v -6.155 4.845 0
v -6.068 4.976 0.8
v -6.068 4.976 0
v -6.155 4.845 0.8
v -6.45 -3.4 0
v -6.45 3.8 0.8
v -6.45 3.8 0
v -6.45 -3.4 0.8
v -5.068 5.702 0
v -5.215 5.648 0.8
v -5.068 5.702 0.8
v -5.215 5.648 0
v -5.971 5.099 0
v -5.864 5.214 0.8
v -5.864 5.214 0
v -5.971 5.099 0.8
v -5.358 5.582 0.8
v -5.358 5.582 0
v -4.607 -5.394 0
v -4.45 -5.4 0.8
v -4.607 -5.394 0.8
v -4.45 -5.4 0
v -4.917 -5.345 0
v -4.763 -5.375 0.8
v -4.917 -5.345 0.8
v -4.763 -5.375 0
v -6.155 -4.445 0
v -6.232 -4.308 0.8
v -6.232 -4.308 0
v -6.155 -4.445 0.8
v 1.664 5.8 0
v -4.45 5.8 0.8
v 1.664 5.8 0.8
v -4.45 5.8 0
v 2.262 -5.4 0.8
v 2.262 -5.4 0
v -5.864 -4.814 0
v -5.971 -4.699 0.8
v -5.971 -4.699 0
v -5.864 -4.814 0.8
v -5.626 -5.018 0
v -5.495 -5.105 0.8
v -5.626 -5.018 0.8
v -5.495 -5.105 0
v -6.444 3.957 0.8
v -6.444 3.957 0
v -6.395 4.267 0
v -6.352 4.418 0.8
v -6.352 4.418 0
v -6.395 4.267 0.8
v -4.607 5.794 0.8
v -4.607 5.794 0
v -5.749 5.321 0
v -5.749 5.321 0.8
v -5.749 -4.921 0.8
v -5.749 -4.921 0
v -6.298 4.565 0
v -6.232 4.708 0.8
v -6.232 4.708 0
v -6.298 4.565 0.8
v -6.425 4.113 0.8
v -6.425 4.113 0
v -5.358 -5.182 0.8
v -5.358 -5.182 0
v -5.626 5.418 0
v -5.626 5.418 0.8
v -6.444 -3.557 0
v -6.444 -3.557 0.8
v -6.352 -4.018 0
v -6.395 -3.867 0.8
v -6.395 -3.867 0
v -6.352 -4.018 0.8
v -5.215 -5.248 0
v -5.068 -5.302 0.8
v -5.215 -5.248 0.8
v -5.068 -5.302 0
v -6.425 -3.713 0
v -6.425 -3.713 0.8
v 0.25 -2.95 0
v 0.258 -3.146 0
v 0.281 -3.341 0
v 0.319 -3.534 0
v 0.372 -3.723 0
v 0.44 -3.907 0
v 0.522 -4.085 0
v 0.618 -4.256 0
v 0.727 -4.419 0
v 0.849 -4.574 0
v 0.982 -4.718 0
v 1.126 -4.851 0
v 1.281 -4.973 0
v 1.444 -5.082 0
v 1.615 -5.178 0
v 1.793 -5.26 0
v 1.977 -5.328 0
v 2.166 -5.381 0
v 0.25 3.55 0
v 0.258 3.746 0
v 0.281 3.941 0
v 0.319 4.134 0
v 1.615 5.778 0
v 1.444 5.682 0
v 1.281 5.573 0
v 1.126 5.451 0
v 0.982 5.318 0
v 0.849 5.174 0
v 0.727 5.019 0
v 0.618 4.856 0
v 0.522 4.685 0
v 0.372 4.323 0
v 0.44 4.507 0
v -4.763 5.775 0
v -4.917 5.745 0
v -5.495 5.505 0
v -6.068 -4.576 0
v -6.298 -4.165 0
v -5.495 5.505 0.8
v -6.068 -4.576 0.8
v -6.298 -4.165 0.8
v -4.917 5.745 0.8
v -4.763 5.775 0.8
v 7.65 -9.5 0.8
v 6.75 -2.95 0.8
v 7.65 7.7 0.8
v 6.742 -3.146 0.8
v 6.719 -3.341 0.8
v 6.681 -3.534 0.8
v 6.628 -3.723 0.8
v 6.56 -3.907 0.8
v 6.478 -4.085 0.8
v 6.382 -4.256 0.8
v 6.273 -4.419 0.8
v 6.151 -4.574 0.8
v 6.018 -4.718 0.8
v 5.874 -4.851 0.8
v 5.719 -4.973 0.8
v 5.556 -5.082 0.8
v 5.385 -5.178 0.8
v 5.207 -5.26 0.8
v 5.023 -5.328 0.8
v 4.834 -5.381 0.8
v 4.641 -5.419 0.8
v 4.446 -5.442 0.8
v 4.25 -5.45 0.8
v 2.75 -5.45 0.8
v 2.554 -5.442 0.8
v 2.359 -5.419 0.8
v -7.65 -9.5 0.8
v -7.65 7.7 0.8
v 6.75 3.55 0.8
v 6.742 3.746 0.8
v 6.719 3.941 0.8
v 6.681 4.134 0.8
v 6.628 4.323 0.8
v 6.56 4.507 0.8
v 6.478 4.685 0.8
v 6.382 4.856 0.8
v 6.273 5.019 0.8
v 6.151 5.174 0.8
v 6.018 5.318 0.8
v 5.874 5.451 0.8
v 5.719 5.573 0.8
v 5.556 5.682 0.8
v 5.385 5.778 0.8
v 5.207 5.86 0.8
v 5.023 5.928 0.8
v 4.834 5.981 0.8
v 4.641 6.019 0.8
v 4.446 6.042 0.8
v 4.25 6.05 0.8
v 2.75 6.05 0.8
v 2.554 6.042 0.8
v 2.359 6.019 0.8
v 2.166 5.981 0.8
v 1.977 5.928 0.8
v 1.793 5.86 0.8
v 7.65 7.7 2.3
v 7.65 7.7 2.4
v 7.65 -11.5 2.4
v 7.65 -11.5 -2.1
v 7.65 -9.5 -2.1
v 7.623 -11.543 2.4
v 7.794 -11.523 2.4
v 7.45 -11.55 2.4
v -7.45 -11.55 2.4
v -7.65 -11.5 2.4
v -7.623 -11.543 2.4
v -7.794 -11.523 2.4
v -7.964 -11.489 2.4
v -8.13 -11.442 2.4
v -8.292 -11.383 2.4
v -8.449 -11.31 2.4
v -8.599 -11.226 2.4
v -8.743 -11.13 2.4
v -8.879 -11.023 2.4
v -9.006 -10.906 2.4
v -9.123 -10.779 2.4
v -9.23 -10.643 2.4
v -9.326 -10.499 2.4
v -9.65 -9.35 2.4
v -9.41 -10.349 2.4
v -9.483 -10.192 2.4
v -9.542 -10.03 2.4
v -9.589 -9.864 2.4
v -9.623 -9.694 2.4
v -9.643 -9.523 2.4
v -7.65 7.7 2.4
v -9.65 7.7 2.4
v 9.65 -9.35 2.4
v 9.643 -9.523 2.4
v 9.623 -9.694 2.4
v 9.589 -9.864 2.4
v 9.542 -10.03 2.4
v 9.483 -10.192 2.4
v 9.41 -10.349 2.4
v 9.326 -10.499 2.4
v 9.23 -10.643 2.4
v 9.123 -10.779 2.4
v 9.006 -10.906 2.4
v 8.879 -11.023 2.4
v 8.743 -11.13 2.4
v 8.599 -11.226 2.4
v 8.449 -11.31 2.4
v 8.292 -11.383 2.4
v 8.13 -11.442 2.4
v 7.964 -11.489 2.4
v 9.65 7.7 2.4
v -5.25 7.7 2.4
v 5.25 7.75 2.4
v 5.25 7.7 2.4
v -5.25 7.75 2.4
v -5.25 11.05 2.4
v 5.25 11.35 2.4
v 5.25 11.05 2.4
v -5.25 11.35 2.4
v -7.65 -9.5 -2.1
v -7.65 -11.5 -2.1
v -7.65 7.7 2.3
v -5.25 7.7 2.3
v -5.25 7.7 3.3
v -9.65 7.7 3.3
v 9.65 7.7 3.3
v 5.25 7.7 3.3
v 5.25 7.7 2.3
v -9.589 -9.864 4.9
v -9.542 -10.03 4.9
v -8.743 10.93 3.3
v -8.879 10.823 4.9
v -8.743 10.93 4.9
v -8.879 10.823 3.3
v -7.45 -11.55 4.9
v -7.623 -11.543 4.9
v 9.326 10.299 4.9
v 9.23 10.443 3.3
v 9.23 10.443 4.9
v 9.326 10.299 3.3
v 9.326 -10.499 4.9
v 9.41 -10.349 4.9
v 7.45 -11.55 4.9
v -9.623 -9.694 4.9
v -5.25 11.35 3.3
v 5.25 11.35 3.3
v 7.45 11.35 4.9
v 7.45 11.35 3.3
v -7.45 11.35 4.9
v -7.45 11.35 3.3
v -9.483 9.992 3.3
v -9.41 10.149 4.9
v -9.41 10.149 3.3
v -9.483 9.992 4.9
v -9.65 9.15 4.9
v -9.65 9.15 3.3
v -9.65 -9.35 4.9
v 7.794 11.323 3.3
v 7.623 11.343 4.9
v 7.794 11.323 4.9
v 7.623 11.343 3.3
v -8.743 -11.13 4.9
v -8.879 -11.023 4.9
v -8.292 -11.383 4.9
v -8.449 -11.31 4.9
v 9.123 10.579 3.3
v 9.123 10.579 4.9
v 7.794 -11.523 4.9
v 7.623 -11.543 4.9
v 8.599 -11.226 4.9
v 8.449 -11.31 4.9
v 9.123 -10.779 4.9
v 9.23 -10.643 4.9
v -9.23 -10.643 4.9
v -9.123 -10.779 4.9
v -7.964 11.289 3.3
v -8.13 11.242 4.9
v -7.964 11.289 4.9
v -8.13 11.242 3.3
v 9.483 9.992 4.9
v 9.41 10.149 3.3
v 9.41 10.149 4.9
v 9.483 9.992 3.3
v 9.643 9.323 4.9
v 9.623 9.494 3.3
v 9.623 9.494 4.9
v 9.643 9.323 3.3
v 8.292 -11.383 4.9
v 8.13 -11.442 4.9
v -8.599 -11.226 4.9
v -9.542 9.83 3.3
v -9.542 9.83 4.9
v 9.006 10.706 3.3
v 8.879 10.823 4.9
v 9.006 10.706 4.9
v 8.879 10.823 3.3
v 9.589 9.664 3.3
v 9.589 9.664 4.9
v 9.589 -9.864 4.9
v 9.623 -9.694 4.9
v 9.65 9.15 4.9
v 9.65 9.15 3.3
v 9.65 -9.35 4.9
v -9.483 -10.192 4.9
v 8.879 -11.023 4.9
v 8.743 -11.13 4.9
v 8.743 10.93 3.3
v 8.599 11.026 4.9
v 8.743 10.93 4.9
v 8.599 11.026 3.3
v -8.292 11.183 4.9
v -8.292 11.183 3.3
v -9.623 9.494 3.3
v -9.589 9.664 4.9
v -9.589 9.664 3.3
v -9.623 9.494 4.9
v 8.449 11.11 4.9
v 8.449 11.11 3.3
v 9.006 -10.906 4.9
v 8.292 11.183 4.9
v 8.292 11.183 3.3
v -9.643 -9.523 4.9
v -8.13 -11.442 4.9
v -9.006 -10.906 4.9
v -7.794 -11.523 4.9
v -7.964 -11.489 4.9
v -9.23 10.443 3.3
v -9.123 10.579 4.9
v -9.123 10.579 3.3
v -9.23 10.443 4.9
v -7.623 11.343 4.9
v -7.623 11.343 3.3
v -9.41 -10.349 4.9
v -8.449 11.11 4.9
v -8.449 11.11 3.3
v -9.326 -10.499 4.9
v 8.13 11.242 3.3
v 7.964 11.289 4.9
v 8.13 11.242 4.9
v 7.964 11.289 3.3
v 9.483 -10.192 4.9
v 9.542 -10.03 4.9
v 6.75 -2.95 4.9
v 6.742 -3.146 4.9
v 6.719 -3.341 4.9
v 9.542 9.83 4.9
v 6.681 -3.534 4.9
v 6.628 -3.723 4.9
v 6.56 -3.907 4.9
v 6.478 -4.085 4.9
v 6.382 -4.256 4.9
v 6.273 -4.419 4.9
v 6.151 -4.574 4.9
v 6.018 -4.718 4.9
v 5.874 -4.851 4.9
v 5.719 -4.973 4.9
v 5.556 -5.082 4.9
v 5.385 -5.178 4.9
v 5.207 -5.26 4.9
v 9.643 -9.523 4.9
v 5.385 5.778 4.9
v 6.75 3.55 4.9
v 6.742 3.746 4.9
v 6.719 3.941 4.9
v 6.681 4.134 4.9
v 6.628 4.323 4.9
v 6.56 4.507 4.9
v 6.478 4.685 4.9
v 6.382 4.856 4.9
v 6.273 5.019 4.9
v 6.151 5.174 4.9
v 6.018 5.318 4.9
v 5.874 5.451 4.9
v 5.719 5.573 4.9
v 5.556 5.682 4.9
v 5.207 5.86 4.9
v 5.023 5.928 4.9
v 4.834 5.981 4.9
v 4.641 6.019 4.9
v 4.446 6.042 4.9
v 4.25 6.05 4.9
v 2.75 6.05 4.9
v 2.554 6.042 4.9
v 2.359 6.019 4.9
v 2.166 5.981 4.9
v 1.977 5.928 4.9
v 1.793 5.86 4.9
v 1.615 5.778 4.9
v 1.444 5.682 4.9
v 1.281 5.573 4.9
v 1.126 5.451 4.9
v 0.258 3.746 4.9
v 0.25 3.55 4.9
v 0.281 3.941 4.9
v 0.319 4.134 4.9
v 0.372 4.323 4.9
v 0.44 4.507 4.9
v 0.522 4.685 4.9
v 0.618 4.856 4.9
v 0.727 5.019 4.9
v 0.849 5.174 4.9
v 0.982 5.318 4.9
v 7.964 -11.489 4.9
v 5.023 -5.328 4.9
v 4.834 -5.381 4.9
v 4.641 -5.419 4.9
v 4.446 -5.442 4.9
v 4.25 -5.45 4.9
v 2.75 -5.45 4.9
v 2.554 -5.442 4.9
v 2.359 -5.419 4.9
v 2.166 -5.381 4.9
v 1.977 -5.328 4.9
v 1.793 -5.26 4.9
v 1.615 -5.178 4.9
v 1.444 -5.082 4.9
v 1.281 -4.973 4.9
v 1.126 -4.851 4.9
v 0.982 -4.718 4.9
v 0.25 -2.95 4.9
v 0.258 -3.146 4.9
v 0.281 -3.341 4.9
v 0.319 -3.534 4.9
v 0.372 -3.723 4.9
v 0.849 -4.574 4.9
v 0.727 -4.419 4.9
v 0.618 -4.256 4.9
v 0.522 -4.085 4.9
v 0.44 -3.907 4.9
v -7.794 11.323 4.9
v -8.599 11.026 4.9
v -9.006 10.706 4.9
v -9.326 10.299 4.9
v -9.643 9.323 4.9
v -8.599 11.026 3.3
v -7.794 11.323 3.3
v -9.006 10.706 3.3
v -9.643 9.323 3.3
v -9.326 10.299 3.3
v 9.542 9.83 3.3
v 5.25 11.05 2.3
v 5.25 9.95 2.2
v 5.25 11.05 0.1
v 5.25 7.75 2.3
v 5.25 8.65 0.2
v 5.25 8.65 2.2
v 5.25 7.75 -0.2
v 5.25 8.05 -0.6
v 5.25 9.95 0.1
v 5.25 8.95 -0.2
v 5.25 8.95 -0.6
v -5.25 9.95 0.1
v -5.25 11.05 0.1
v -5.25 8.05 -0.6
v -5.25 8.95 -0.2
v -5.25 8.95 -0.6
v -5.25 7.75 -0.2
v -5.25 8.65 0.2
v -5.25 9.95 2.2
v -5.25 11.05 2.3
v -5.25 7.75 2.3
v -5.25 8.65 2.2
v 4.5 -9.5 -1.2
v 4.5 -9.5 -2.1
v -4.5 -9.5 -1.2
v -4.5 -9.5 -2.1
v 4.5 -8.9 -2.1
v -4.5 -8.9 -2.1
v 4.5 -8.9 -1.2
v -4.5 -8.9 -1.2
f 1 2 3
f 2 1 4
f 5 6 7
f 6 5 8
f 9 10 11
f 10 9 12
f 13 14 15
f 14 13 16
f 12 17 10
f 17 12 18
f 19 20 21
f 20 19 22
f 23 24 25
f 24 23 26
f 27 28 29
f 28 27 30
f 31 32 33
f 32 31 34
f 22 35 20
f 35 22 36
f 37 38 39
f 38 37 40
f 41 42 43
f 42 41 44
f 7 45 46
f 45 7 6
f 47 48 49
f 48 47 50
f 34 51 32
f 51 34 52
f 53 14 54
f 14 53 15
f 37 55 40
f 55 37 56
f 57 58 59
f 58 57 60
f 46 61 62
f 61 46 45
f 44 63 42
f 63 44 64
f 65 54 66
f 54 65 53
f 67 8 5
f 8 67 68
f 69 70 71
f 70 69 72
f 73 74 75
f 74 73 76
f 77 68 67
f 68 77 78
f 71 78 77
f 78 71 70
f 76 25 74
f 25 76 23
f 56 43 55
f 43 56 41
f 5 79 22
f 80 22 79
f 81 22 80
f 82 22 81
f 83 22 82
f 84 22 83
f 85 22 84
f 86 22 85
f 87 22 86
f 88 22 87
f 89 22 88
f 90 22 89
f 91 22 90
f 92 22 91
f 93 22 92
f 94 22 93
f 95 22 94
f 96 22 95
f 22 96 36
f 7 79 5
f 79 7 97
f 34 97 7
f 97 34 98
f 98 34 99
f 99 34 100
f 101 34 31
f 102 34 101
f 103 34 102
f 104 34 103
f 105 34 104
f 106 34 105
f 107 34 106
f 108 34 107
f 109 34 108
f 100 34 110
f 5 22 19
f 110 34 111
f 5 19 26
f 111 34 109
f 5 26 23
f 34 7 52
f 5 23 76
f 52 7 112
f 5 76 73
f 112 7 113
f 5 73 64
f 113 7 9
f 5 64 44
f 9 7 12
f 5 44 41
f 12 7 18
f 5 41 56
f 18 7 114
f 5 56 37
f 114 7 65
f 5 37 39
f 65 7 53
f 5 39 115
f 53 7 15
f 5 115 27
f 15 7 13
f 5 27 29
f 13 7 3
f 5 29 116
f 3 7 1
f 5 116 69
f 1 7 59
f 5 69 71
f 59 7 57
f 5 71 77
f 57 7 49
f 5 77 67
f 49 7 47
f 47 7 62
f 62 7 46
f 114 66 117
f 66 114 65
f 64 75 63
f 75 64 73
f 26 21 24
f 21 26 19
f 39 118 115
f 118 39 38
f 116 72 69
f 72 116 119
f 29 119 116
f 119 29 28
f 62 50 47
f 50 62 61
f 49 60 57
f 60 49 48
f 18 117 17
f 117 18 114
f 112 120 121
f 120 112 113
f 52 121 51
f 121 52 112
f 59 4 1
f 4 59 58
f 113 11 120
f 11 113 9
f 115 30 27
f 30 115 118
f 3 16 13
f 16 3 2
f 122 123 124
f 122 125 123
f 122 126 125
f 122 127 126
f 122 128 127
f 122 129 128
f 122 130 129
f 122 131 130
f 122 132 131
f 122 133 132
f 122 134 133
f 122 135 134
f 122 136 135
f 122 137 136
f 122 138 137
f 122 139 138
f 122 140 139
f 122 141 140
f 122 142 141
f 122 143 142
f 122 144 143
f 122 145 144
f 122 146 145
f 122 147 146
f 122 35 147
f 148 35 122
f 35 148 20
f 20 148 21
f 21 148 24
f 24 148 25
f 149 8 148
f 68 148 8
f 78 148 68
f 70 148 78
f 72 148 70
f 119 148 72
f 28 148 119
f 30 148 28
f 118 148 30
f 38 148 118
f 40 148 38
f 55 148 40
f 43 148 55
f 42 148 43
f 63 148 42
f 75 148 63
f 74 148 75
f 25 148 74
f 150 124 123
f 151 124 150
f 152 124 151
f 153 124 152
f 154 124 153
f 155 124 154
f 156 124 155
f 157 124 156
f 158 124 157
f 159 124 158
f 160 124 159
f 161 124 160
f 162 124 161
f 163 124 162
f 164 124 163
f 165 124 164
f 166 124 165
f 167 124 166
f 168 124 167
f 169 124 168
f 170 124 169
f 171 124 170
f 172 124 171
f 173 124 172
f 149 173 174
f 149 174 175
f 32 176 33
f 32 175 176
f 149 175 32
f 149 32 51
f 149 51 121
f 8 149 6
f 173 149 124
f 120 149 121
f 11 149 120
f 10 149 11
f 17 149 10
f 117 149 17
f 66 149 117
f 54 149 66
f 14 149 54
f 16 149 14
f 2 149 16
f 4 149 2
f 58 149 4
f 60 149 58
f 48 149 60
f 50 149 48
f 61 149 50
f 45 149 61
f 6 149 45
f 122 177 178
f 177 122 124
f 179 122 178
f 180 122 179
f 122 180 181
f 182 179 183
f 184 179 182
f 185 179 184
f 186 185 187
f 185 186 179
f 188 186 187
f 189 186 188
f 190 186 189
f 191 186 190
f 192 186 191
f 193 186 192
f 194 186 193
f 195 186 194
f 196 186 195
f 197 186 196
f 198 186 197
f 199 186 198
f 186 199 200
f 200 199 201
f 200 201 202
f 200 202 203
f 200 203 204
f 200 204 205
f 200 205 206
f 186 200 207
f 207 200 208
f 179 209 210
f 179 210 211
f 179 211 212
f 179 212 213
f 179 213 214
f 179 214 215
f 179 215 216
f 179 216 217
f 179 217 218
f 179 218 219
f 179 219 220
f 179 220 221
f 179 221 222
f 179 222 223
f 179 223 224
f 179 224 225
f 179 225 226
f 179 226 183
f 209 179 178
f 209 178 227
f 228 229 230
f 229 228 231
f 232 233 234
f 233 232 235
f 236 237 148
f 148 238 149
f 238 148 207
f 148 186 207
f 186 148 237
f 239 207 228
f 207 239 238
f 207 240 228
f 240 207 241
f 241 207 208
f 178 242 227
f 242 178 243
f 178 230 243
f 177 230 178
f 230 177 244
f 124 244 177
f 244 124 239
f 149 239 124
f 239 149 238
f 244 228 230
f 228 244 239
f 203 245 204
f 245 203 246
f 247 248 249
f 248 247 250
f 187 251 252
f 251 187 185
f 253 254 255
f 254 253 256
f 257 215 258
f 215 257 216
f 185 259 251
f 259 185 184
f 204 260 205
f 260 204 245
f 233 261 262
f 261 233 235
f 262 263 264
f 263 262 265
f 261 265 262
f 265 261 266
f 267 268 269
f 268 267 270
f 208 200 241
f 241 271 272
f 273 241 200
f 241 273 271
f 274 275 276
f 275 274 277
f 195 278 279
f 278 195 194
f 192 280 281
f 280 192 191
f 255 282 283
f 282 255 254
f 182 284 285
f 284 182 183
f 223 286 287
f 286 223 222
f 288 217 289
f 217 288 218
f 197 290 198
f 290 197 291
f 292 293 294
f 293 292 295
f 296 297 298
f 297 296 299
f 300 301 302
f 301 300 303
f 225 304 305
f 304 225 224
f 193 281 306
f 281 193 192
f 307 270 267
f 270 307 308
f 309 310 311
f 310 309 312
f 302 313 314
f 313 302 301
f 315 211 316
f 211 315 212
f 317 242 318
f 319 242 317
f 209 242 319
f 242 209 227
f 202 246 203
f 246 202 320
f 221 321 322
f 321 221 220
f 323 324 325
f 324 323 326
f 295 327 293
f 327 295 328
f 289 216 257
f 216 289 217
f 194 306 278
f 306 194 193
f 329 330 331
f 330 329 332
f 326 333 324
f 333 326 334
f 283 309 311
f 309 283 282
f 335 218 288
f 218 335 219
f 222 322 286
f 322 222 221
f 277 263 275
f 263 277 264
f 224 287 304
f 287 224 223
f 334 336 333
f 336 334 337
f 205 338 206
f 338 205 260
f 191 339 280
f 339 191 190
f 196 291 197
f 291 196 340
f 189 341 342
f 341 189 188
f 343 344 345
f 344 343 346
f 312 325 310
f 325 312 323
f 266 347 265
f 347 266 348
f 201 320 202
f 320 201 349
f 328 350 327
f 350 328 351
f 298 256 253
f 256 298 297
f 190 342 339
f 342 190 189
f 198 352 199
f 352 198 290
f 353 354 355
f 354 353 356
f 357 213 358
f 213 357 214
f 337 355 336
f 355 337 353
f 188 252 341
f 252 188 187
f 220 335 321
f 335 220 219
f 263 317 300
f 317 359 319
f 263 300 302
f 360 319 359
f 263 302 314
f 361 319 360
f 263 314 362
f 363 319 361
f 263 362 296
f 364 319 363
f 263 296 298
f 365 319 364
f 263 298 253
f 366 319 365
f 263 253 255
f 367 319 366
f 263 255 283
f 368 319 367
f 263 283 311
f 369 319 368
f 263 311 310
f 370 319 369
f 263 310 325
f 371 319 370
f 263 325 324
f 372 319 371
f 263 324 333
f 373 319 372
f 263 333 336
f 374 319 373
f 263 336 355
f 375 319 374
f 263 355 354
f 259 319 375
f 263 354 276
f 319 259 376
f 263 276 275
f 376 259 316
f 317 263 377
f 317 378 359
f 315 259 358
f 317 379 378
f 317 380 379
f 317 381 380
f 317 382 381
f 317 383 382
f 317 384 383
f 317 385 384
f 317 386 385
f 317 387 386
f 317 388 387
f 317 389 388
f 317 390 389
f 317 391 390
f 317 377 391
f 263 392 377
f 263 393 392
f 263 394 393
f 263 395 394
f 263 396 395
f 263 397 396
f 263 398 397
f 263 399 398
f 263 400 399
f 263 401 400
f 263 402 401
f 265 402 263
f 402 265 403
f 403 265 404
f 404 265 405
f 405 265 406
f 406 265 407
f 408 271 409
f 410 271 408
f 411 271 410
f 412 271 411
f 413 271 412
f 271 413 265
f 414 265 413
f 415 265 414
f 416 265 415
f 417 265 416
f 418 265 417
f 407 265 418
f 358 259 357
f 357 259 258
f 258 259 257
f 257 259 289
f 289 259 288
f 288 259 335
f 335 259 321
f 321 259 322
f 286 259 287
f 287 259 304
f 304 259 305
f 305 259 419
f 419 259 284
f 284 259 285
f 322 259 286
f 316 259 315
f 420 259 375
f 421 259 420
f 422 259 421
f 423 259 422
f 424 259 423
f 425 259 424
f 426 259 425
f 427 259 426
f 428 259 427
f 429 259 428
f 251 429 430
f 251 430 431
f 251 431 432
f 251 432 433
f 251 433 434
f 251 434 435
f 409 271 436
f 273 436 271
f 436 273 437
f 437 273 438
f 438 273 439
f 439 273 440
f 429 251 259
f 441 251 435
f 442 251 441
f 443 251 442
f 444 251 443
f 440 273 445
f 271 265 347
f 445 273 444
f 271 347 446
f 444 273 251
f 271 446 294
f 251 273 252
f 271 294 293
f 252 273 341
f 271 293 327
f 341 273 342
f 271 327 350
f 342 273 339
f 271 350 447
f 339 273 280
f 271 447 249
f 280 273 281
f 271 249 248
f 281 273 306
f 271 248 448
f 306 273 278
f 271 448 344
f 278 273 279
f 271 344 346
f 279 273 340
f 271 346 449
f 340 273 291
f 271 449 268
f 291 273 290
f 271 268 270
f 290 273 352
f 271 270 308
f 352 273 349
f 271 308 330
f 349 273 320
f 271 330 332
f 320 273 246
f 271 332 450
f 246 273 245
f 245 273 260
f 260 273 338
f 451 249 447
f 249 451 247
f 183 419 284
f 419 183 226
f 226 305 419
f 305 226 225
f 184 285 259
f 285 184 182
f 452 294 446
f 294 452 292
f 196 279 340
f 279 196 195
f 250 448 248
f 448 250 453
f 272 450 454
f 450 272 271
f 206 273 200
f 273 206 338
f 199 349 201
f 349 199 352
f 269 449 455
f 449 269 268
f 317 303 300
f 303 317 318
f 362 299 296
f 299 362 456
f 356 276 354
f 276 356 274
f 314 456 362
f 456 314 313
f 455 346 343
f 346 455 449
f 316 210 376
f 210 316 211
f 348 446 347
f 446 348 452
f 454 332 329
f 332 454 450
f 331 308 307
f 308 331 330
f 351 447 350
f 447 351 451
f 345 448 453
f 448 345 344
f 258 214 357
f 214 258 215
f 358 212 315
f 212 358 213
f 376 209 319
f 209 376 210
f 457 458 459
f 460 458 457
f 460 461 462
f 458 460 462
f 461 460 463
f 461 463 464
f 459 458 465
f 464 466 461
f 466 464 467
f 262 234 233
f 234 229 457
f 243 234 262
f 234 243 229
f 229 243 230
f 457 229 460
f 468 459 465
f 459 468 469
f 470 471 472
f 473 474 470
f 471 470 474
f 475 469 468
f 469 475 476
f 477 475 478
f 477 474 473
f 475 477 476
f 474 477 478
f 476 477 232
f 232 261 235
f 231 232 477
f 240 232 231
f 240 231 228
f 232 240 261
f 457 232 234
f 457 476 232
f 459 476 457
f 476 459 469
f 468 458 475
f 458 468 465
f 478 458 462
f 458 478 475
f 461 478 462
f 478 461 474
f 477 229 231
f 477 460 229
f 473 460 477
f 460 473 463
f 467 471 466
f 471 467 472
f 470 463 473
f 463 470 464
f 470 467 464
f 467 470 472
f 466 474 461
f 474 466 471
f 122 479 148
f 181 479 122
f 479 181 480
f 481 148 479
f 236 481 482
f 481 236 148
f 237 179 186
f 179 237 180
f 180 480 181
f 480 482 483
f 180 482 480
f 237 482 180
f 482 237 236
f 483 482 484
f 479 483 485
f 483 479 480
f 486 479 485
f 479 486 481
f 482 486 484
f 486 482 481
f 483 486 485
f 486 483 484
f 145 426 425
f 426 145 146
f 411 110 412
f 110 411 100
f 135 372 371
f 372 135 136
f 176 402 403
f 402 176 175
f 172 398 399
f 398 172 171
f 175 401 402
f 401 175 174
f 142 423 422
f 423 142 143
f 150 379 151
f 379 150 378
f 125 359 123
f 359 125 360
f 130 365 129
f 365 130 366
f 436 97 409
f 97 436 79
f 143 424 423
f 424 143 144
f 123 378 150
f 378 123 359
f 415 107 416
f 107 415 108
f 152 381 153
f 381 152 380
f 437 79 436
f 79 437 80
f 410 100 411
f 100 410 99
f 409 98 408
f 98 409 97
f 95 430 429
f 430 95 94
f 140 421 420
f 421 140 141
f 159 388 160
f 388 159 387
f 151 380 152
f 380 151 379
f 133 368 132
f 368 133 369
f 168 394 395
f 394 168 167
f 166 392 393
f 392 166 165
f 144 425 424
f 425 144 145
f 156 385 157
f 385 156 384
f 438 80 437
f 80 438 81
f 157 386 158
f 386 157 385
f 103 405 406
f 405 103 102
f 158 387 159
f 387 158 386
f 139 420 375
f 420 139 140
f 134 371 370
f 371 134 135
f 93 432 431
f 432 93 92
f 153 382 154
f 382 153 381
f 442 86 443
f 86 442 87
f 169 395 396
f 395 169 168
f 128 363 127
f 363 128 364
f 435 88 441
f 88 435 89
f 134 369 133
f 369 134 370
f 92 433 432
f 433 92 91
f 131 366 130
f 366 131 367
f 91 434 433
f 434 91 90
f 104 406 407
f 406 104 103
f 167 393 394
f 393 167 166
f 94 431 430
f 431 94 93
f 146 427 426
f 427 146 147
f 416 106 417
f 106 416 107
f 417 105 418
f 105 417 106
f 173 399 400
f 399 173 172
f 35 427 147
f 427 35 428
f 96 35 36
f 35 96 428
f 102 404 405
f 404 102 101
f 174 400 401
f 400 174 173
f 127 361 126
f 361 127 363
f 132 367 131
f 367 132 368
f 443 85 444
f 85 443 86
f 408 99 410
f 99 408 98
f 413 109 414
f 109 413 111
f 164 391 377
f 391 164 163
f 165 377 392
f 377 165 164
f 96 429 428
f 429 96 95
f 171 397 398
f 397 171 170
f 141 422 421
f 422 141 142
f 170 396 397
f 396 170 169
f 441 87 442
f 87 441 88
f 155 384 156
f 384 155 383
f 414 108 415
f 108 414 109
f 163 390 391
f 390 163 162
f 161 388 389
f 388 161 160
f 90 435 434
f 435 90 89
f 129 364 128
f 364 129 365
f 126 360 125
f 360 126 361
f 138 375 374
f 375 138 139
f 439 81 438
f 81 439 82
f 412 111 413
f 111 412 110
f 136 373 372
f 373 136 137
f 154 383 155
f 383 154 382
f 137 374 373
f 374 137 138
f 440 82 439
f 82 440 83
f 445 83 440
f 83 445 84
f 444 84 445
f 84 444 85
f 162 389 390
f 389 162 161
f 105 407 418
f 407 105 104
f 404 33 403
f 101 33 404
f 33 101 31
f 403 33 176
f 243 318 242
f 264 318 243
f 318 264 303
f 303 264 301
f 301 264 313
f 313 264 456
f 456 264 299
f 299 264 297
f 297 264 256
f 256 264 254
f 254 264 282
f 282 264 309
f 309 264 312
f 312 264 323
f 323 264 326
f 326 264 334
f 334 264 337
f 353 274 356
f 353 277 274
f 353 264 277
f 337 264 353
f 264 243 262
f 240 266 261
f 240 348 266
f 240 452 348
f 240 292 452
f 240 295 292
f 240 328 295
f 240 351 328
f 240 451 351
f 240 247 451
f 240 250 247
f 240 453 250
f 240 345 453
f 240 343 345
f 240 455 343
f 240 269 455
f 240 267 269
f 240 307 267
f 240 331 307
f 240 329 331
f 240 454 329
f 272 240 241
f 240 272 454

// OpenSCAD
// Written by WolfOne
// License - CC BY 4.0
// https://github.com/Wolf-0ne/3d-modeling-projects
//action 4 usb-c door

$fn = 80;

innerStepYOffset=0.2;
innerStepX=13;
innerStepY=11.3;
innerStepZ=.8;

outerStepYOffset=-1.5;
outerStepX=15.4;
outerStepY=18.5;
outerStepZ=1.6;

topStepYOffset=-.1;
topStepX=19.3;
topStepY=23;
topStepZ=2.5;

lockYOffset=outerStepY/2+outerStepYOffset;
lockX=10.5;
lockY=.9;
lockZ=innerStepZ+outerStepZ+1;
lockCenter=2.3;
lockTangYA=0.2;
lockTangZA=0.1;
lockTangYB=0.5;
lockTangZB=1.3;
lockLipYOffset=.3;
lockLipZOffset=.4;

c=0.1; //clearance

medium = 0;
large = 0;

difference(){
	union(){
	
		// Main Body
		translate([0,innerStepYOffset,0])
			roundedSquare(innerStepX-c,innerStepY-c,innerStepZ,2);
		translate([0,outerStepYOffset,outerStepZ/2+innerStepZ])
			cube([outerStepX-c,outerStepY-c,outerStepZ], center=true);
		if (large == 0 && medium == 0){
			translate([0,topStepYOffset,outerStepZ+innerStepZ])
				roundedSquare(topStepX,topStepY-c,topStepZ,2.2);
			}
		else if (medium != 0){
			translate([0,topStepYOffset,outerStepZ+innerStepZ])
				hull(){
					roundedSquare(topStepX,topStepY-c,topStepZ,2.2);
					translate([c*2,0,2])
						roundedSquare(topStepX-3,topStepY-c-3,topStepZ,2.2);
					}
			}
		else {
			translate([0,topStepYOffset,outerStepZ+innerStepZ])
				hull(){
					roundedSquare(topStepX,topStepY-c,topStepZ,2.2);
					translate([1,0,4])
						roundedSquare(topStepX-5,topStepY-c-4,topStepZ,2.2);
					}
			} 
			
		//Lock Area
		translate([0,lockYOffset+lockY/2+lockCenter,lockZ/2+lockTangZA])
			cube([lockX,lockY+lockTangYA,lockZ], center=true);	
		translate([0,lockYOffset+lockY/2+lockCenter/2,lockZ/2+lockTangZB])
			cube([lockX,lockY+lockTangYB,1.6], center=true);
		
		translate([0,lockYOffset+lockY/2,lockZ/2])
			cube([lockX,lockY,lockZ], center=true);
		hull(){
			translate([0,lockYOffset+lockY/2+lockLipYOffset,-lockLipZOffset])
				cube([lockX,lockY,lockLipZOffset], center=true);	
			translate([0,lockYOffset+lockY/2,0])
				cube([lockX,lockY,lockLipZOffset], center=true);	
			}
			
		//Latch Area ( kinda brute forced )
		translate([0,-topStepY/2+1,1.1])
			cube([topStepX-4,2,3], center=true);
		translate([0,0,-outerStepZ-.1])
		translate([0,-topStepY/2+1,1.1])
			cube([topStepX-4,2,3], center=true);
			
		translate([0,0,-3.05])
		translate([0,-topStepY/2+2.1,1.4])
			cube([9,1,.9], center=true);
			
		}
	union(){
		//USB-C
		translate([3.5,.3,-1])
			roundedSquare(6.5, 11.5, 10, 2.5);
			
		//Cutouts
		translate([topStepX/2-2,topStepY/2-1.95,2.8])
			cube([4.8,3.7,1], center=true);
		translate([-topStepX/2+2,topStepY/2-1.95,2.8])
			cube([4.8,3.7,1], center=true);
		}
	}
	
	
module roundedSquare(xs, ys, z, r=1){
	
	x = xs - r * 2;
	y = ys - r * 2;
	
  translate([-x/2, -y/2, 0])
	hull(){
		translate([0,0,0])
			cylinder(h=z,r=r);
		translate([0,y,0])
			cylinder(h=z,r=r);
		translate([x,0,0])
			cylinder(h=z,r=r);
		translate([x,y,0])
			cylinder(h=z,r=r);
		}

	}
